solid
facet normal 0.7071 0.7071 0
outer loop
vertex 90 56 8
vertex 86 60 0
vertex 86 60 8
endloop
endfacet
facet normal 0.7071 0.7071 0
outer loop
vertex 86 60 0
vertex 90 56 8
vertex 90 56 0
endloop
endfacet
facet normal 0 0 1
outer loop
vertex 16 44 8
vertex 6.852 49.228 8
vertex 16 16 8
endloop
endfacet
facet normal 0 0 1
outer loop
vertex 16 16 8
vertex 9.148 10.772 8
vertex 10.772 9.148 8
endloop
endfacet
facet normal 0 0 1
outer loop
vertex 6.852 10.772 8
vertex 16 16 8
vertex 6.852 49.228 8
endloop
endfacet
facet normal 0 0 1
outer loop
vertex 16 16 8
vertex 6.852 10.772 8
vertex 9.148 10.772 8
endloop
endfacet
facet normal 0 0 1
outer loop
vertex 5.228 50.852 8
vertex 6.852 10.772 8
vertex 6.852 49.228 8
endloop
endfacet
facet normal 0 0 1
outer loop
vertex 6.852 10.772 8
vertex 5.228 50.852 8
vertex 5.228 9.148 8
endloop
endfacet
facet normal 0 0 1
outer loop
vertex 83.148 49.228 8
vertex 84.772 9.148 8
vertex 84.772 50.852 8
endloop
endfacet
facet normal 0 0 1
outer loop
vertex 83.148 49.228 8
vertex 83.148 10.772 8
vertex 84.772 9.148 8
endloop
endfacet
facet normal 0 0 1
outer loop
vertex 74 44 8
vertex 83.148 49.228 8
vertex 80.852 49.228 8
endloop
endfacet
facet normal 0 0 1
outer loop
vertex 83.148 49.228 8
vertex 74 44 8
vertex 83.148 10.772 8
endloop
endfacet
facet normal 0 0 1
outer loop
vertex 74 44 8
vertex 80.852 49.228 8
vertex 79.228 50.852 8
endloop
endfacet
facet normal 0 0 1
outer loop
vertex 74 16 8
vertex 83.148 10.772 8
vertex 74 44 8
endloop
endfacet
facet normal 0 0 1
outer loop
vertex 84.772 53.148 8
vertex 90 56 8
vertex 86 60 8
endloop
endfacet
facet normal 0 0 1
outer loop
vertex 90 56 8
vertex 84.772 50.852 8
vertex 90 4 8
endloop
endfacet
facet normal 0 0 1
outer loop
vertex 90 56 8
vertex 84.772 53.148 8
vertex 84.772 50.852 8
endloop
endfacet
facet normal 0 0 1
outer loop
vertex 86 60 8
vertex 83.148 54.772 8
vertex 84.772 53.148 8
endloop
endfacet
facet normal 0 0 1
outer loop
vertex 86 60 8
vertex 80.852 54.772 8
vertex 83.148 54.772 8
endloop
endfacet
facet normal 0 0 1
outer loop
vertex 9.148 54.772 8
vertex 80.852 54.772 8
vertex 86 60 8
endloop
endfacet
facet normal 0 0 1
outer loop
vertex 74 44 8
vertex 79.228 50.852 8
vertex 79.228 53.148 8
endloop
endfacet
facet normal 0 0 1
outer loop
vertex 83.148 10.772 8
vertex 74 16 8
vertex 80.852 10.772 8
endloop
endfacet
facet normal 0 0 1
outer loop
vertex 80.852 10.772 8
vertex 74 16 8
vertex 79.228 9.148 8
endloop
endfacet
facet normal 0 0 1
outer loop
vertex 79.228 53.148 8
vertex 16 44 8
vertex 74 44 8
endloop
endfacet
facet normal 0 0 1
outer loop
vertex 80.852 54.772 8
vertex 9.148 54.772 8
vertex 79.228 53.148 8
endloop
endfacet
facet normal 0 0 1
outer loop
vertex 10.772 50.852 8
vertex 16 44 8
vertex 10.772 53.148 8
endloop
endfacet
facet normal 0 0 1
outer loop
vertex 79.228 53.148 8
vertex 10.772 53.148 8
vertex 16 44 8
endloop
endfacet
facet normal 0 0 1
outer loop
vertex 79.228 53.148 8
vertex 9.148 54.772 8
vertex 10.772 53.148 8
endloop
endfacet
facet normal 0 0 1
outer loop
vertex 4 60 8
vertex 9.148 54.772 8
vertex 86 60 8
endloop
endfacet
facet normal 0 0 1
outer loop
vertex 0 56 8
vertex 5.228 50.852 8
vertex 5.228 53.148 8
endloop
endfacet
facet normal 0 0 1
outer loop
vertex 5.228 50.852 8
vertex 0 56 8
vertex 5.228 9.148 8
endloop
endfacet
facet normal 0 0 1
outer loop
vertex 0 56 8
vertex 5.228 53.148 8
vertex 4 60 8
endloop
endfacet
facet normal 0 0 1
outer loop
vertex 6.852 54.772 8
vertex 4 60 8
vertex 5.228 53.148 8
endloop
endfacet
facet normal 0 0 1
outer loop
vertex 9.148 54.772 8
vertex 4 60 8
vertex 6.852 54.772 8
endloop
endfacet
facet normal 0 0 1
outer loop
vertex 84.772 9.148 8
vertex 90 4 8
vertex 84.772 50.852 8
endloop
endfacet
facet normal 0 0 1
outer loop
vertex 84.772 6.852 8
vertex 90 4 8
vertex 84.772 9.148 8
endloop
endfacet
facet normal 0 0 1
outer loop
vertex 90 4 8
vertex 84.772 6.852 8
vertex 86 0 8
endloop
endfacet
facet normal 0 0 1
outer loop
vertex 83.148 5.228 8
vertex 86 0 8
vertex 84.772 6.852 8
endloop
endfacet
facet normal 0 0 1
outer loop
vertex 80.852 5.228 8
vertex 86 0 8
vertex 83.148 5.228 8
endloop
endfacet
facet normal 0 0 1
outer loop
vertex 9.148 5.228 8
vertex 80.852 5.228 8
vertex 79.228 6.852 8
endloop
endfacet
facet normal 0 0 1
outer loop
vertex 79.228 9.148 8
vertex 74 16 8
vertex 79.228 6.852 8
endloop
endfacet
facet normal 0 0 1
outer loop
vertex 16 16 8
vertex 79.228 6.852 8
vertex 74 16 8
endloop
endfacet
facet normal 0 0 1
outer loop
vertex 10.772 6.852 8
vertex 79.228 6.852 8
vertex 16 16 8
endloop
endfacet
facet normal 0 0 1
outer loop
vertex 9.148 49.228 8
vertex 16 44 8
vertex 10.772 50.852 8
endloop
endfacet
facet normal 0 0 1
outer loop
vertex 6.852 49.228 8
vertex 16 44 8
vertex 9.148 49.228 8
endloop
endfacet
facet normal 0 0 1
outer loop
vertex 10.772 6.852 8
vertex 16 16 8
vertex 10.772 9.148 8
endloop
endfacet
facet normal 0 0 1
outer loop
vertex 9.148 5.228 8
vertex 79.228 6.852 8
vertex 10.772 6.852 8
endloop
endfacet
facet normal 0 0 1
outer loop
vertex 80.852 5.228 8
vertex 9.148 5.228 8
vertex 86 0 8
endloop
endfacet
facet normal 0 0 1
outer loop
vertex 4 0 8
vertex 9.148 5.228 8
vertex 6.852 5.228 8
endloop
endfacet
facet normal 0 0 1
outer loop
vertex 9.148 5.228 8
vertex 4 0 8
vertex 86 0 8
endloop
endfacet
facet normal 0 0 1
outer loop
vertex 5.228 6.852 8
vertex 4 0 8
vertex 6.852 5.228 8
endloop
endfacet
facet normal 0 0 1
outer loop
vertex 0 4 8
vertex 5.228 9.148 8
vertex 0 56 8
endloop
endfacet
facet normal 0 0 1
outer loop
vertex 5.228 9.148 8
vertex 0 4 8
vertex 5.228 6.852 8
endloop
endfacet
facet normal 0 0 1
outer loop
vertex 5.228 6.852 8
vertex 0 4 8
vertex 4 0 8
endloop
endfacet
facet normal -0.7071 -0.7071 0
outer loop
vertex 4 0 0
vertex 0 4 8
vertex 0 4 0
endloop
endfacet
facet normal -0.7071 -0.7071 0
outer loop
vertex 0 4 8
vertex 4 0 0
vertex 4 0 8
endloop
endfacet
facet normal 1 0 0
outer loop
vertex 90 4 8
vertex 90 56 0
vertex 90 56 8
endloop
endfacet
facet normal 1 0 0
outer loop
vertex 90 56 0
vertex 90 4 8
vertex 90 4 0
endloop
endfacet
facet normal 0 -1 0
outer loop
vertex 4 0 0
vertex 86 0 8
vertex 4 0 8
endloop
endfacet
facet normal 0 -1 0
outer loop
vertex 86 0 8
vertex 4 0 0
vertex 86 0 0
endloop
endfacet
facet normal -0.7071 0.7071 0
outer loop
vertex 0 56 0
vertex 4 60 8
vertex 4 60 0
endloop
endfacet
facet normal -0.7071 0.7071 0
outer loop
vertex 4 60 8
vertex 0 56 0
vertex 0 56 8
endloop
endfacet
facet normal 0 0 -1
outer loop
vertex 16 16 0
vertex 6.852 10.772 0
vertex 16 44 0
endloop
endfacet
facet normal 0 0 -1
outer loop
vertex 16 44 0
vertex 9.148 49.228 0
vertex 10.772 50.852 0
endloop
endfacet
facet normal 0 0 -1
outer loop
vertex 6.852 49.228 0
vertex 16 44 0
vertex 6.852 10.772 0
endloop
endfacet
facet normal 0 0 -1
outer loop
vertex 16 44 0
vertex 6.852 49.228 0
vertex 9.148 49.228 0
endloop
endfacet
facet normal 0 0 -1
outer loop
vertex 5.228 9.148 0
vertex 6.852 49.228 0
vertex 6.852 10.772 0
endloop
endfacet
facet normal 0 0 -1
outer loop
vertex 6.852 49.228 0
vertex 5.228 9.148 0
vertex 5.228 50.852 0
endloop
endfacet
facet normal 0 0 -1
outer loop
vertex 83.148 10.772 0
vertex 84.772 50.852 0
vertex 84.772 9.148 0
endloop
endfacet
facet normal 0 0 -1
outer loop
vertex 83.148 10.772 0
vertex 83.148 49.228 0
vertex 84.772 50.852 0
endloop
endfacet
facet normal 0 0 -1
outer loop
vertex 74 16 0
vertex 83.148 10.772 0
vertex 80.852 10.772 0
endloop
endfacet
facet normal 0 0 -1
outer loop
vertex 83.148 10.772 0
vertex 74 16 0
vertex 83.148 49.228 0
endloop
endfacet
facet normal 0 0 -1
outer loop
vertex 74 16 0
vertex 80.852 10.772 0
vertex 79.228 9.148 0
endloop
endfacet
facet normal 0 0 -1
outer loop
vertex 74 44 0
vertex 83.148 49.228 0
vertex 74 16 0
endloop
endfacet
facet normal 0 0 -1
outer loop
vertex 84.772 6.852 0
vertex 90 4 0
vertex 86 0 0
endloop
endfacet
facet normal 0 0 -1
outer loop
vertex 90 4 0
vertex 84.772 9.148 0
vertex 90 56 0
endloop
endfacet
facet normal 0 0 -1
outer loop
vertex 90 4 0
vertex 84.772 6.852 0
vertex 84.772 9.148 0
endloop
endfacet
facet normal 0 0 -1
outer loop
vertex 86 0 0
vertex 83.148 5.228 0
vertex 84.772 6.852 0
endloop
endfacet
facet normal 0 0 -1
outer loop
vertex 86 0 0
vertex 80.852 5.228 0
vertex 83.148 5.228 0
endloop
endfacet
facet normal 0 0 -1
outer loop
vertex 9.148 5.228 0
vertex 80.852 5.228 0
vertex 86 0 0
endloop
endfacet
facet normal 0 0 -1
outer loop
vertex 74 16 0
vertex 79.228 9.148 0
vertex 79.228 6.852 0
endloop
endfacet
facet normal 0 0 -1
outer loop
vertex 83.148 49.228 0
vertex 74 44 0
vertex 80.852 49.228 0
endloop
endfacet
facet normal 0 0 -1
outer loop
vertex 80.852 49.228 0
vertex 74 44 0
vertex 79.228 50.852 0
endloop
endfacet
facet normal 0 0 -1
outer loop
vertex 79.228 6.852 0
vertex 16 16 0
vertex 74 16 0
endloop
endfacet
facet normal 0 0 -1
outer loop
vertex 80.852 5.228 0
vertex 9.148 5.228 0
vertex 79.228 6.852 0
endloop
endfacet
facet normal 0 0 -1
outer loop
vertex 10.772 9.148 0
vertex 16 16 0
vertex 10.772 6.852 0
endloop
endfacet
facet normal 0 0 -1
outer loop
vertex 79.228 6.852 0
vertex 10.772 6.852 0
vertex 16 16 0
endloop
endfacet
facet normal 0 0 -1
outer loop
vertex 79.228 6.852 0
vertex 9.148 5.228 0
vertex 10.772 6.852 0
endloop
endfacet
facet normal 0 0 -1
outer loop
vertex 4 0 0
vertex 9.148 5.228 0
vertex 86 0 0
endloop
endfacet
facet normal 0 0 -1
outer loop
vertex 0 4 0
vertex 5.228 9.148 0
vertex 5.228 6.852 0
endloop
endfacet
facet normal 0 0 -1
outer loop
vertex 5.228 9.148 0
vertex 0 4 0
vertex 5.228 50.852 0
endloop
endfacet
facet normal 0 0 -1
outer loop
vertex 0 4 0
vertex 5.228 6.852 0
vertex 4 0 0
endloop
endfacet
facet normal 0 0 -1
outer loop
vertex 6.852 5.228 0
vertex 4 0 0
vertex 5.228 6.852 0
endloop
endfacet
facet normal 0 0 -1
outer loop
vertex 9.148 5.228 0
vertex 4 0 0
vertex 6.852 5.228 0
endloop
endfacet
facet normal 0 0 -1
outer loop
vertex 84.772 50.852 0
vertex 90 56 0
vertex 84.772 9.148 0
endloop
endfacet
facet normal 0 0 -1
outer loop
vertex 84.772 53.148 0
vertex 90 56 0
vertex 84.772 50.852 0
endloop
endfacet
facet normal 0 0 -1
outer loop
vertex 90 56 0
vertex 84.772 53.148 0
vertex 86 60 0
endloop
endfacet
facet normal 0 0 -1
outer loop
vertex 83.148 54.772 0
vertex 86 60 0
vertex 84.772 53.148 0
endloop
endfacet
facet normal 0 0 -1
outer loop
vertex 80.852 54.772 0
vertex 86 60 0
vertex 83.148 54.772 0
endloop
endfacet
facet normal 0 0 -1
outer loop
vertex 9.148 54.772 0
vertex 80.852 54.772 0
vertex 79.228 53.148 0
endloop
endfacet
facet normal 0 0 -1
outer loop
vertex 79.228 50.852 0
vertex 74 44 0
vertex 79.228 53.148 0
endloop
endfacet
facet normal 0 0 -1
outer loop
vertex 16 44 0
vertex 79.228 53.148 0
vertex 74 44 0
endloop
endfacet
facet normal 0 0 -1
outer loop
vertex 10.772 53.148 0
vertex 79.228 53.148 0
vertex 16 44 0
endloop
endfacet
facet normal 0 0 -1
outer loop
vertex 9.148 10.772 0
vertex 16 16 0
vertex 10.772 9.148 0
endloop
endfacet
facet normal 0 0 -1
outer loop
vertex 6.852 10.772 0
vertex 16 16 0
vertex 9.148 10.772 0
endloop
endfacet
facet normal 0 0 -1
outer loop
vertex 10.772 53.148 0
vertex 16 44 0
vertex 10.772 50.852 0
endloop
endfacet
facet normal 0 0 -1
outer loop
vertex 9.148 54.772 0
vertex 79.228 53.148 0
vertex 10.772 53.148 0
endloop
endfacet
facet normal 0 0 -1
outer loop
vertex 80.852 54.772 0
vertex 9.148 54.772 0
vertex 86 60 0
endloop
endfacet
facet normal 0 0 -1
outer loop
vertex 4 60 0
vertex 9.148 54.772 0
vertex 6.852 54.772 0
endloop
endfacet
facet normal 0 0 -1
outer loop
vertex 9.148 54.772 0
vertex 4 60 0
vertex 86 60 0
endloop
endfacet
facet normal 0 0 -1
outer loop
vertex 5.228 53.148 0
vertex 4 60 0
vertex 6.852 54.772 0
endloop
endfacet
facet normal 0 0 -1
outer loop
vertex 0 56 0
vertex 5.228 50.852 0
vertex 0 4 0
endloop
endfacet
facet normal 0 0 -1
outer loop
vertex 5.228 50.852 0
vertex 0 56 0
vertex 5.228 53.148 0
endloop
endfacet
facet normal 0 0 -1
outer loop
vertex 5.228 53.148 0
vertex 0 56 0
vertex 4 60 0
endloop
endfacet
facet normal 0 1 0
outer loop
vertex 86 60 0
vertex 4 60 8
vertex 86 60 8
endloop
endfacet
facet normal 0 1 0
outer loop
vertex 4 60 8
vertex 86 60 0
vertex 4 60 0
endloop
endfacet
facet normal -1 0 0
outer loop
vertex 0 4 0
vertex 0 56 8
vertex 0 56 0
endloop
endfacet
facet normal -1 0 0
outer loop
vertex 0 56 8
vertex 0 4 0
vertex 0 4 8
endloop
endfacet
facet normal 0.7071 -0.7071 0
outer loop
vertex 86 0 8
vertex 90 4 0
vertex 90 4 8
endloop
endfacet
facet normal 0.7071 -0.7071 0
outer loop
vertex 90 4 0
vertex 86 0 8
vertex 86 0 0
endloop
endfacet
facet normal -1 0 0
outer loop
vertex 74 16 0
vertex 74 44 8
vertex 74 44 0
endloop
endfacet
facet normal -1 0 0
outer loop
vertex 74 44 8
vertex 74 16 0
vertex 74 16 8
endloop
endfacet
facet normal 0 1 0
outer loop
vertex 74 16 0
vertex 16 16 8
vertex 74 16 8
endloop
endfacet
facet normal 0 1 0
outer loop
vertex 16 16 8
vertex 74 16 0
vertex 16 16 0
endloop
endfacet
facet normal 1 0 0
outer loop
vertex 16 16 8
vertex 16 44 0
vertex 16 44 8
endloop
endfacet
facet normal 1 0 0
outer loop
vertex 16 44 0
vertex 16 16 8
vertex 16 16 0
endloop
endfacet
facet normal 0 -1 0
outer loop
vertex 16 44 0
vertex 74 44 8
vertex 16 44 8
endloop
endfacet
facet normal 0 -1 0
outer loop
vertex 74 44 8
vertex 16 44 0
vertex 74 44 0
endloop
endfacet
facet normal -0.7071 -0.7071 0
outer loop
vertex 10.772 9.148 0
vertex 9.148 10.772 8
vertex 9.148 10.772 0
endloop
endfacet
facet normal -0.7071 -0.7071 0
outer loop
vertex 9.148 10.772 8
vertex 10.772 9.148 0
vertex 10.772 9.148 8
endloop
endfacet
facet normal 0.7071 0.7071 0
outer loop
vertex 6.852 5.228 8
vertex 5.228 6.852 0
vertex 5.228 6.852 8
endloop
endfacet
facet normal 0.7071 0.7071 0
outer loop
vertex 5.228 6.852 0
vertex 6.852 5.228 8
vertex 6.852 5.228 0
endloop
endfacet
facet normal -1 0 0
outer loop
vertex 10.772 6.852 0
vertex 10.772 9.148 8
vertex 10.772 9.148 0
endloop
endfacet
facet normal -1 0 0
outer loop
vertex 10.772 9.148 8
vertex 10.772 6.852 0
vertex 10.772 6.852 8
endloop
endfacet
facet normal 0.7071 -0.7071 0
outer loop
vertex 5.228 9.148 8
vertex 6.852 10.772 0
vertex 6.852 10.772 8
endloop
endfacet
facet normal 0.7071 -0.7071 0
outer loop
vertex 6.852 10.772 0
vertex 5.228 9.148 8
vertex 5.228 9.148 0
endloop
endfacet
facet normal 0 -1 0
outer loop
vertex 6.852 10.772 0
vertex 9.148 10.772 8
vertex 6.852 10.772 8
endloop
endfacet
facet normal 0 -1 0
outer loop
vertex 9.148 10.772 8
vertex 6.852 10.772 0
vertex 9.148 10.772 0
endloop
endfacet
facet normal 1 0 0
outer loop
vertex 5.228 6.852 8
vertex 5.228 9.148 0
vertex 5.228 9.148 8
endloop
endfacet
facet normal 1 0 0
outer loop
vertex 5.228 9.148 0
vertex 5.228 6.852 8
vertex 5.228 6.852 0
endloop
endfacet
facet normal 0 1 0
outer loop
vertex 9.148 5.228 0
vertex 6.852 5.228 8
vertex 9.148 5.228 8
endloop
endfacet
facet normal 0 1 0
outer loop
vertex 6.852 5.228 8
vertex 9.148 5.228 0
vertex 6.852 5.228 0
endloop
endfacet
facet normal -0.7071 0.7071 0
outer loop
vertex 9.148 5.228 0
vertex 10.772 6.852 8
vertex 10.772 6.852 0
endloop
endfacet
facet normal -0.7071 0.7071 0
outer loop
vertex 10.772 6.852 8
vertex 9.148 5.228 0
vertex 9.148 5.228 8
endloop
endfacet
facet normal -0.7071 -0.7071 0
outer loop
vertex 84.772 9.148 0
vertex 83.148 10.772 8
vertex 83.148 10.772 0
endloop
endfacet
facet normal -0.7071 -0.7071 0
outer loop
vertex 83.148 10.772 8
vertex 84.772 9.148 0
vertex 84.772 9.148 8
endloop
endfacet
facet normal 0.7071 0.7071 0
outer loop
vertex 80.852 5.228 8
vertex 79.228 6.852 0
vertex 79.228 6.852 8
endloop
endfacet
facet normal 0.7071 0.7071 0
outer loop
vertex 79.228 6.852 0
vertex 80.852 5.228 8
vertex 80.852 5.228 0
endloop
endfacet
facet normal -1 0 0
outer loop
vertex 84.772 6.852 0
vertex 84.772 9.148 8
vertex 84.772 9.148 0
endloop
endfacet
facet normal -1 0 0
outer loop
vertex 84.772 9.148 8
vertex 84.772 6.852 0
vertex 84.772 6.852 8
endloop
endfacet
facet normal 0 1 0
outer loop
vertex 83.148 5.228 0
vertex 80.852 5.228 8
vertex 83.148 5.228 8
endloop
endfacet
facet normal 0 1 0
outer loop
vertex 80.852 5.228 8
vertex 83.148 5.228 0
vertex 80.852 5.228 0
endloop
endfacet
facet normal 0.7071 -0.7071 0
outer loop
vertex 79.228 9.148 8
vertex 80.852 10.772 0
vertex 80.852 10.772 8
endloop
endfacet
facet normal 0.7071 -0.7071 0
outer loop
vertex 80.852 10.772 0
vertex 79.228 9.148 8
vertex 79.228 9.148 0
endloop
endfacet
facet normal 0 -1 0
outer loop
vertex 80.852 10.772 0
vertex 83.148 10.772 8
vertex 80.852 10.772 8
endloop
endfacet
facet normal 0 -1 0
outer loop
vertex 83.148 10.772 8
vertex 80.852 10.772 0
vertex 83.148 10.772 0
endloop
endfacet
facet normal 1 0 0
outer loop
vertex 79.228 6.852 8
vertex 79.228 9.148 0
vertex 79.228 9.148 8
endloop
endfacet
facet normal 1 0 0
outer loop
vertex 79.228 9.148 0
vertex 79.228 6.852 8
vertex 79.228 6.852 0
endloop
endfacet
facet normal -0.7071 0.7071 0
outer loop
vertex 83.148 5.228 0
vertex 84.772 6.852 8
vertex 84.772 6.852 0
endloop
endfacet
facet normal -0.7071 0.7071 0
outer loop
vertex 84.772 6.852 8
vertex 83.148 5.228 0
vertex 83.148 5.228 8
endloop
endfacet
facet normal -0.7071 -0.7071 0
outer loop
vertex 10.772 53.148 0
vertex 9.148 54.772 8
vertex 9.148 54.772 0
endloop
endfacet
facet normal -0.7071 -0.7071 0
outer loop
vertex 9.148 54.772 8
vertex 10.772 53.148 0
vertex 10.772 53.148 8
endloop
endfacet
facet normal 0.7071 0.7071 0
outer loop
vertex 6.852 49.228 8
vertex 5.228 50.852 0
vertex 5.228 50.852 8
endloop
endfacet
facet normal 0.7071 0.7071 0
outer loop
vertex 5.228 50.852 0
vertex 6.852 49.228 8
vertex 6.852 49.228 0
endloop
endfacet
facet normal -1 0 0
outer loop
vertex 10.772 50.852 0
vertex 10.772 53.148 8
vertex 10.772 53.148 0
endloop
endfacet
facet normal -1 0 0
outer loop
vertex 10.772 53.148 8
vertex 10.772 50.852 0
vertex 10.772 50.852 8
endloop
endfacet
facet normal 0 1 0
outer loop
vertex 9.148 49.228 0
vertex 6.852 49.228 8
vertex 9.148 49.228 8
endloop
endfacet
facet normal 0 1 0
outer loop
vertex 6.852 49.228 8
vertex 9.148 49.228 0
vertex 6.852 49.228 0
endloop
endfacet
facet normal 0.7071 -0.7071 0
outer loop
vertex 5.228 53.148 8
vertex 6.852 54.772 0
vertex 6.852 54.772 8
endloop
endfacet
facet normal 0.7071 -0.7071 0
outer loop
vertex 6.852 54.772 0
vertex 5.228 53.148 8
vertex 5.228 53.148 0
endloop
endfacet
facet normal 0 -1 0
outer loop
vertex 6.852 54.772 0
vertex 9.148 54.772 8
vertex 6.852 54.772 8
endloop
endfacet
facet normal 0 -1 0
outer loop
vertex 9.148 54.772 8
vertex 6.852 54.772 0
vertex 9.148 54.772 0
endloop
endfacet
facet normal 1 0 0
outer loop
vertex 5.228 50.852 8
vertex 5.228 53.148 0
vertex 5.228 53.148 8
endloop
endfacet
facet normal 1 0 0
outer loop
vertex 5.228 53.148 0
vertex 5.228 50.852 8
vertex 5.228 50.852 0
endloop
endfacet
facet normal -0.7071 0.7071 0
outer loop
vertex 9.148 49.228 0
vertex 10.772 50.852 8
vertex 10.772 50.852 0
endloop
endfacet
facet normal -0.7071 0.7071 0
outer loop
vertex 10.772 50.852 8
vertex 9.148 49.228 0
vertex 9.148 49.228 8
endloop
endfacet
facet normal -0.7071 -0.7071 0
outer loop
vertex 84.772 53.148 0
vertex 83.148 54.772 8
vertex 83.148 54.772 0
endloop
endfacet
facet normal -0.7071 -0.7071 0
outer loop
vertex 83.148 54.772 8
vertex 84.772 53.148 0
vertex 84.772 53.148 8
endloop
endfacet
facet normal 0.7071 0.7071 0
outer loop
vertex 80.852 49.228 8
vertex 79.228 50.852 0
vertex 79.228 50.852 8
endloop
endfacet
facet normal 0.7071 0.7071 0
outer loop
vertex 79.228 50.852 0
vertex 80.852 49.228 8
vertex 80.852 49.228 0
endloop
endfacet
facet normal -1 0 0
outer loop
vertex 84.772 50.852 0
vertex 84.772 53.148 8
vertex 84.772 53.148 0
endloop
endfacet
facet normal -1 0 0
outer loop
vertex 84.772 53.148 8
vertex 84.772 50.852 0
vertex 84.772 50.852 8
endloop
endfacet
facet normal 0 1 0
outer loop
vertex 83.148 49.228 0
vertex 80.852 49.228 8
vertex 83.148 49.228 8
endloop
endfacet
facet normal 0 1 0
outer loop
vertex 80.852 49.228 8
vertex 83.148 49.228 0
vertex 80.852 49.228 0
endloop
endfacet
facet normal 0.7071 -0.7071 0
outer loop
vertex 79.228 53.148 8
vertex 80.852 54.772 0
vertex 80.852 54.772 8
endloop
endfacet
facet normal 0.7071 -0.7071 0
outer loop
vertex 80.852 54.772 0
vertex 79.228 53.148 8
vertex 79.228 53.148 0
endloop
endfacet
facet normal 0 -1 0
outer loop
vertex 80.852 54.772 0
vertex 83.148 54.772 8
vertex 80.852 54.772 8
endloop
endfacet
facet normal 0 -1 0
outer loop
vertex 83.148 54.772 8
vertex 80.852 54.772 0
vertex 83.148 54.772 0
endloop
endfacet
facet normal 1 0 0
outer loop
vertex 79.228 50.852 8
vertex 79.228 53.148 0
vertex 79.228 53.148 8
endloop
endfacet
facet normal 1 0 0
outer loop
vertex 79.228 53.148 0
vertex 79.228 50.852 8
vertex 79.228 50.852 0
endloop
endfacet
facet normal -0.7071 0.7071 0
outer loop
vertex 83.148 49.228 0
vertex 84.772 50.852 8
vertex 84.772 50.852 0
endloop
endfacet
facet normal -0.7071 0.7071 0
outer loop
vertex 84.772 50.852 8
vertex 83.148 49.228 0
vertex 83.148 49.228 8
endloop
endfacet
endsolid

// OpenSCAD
$fn = 32;

// ----------------------------------------------------------------------
// Frame plate: 90 x 60 frame, 16 mm rails
// ----------------------------------------------------------------------

// --- parameters (mm) ---
plate_l = 90;             // plate length, X
plate_w = 60;             // plate width, Y
plate_t = 8;              // plate thickness, Z (extrusion height)
corner_c = 4;             // corner chamfer
frame_bar = 16;           // frame rail width
bolt_r = 3;               // corner bolt window radius
bolt_inset = 8;           // bolt centre inset from the edges

win_l = plate_l - 2 * frame_bar;  // window length
win_w = plate_w - 2 * frame_bar;  // window width
bolt_d = 2 * bolt_r;  // corner hole diameter

profile = [[4, 0], [86, 0], [90, 4], [90, 56], [86, 60], [4, 60], [0, 56], [0, 4]];  // primary outline, 8 points, counter clockwise
void_1 = [[16, 16], [74, 16], [74, 44], [16, 44]];  // the window, 4 points
void_2 = [[10.772, 9.148], [9.148, 10.772], [6.852, 10.772], [5.228, 9.148], [5.228, 6.852], [6.852, 5.228], [9.148, 5.228], [10.772, 6.852]];  // corner bolt window, 8 points
void_3 = [[84.772, 9.148], [83.148, 10.772], [80.852, 10.772], [79.228, 9.148], [79.228, 6.852], [80.852, 5.228], [83.148, 5.228], [84.772, 6.852]];  // corner bolt window, 8 points
void_4 = [[10.772, 53.148], [9.148, 54.772], [6.852, 54.772], [5.228, 53.148], [5.228, 50.852], [6.852, 49.228], [9.148, 49.228], [10.772, 50.852]];  // corner bolt window, 8 points
void_5 = [[84.772, 53.148], [83.148, 54.772], [80.852, 54.772], [79.228, 53.148], [79.228, 50.852], [80.852, 49.228], [83.148, 49.228], [84.772, 50.852]];  // corner bolt window, 8 points

// --- the one profile operation ---
difference() {
  linear_extrude(height = plate_t) polygon(points = profile);
  translate([0, 0, -1])
    linear_extrude(height = plate_t + 2) polygon(points = void_1);
  translate([0, 0, -1])
    linear_extrude(height = plate_t + 2) polygon(points = void_2);
  translate([0, 0, -1])
    linear_extrude(height = plate_t + 2) polygon(points = void_3);
  translate([0, 0, -1])
    linear_extrude(height = plate_t + 2) polygon(points = void_4);
  translate([0, 0, -1])
    linear_extrude(height = plate_t + 2) polygon(points = void_5);
}
